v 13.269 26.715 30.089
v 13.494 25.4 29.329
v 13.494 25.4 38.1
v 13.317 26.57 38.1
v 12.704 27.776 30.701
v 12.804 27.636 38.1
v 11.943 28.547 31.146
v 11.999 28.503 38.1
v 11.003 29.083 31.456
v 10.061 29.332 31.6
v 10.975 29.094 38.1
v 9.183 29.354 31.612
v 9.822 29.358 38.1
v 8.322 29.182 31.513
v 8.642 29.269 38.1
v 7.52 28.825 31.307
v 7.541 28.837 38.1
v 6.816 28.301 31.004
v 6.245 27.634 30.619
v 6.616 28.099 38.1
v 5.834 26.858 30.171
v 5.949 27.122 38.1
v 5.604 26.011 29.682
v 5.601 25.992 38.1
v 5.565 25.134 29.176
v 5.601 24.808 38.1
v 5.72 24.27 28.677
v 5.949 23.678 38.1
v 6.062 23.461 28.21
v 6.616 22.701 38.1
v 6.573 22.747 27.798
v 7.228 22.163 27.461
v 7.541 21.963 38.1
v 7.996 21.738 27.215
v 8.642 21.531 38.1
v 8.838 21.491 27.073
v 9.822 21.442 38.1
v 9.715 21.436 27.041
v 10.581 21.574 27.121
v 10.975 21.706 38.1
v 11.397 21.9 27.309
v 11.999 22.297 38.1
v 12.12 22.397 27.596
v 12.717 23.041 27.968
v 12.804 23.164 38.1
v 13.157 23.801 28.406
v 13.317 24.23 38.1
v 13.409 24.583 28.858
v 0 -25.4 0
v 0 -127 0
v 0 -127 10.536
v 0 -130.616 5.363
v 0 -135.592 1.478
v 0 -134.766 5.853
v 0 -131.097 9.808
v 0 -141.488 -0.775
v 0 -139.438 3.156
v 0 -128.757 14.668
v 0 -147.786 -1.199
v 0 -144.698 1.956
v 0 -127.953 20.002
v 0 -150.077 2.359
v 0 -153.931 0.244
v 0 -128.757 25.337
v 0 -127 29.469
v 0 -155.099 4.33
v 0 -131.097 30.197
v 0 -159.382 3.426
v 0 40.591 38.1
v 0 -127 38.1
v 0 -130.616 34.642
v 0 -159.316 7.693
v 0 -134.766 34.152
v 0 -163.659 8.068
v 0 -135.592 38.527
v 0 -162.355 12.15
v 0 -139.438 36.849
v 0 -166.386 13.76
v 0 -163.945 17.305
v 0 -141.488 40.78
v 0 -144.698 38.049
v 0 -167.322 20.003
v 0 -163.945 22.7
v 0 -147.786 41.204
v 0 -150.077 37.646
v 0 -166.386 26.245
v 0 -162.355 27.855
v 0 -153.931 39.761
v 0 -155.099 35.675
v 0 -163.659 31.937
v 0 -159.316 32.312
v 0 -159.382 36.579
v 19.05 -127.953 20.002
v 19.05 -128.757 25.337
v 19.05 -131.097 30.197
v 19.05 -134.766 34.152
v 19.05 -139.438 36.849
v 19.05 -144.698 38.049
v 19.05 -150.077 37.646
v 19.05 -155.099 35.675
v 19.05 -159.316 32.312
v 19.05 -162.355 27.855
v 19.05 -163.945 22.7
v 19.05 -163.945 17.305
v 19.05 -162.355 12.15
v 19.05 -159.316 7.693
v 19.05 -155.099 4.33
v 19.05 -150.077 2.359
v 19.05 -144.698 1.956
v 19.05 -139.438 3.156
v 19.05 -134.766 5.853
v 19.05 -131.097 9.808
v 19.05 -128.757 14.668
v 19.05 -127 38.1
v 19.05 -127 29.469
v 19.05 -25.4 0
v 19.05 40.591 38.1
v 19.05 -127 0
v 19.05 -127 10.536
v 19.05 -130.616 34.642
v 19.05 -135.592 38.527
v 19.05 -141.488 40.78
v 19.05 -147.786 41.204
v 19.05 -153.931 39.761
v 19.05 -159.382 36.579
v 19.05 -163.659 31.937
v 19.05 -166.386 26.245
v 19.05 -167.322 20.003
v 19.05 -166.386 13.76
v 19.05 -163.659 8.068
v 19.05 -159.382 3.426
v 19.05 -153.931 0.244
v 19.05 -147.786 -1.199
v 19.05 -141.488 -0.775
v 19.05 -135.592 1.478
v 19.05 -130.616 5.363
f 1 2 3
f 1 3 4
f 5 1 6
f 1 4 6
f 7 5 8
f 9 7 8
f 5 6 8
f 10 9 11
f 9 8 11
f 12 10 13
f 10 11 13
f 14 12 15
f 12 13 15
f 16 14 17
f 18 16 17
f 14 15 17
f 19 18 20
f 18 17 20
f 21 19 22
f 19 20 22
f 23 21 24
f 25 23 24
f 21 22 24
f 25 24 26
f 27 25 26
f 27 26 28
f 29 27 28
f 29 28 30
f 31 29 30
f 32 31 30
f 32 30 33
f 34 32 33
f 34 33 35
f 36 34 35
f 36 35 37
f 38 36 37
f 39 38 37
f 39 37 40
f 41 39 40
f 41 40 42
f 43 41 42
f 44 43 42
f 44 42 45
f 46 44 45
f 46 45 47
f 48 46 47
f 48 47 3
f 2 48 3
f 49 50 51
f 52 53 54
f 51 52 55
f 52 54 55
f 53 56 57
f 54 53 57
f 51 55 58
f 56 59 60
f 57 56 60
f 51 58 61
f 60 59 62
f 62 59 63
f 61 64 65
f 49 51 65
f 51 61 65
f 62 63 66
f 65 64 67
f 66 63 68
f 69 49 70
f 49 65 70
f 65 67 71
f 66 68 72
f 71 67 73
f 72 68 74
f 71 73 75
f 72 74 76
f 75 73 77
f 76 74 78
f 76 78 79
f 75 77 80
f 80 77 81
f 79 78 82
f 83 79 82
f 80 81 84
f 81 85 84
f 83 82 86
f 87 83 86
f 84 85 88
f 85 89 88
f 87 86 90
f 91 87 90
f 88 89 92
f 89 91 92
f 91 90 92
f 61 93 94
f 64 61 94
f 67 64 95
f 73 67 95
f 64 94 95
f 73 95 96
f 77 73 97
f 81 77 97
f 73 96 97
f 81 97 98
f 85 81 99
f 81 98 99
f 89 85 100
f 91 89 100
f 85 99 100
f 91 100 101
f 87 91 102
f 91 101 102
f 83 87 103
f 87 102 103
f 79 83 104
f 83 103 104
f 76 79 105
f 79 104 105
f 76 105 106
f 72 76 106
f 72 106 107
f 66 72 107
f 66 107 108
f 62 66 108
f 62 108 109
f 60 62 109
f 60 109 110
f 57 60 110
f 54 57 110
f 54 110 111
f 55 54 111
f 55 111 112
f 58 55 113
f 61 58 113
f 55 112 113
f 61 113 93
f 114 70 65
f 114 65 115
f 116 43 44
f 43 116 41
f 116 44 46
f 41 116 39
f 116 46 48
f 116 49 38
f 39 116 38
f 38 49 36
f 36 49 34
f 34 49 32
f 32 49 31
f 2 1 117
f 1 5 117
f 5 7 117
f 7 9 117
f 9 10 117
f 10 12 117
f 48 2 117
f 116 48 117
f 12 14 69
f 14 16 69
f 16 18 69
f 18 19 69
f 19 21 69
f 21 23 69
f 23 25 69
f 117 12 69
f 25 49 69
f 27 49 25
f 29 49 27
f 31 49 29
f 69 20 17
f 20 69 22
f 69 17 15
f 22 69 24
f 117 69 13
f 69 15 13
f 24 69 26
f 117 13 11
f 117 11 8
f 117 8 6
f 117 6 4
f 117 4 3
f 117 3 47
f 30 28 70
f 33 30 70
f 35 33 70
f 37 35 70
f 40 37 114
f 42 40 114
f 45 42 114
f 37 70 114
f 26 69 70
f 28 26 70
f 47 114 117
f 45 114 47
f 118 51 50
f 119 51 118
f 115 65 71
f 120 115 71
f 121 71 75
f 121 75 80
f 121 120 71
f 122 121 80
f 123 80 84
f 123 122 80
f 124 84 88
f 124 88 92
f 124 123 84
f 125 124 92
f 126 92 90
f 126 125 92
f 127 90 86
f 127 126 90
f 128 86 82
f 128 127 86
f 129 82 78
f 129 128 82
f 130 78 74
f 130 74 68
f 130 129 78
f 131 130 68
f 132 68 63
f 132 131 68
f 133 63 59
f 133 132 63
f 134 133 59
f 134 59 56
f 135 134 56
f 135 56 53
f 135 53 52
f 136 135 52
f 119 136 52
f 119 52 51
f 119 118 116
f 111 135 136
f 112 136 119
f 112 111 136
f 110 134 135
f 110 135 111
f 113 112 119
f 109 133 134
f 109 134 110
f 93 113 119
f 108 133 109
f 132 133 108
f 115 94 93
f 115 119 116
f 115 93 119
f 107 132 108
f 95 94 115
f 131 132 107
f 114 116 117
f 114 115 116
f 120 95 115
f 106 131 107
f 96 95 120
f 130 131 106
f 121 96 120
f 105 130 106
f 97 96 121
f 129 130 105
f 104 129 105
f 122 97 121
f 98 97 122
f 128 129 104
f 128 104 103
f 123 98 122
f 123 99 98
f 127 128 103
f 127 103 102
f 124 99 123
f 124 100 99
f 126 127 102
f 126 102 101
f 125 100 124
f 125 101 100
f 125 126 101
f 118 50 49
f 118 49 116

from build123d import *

# Parameters (mm, degrees)
F0_W     = 19.05
F0_H     = 38.1
F1_DEPTH = 127
F2_R     = 18.0975
F3_DEPTH = 19.05
F5_R     = 3.96875
F6_DEPTH = 39.371
F8_DEPTH = 19.051


with BuildPart() as f1:
    # F0 (on Front) → F1 (new body, symmetric)
    with BuildSketch(Plane.XZ):
        with Locations((9.525, 19.05)):
            Rectangle(F0_W, F0_H)
    extrude(amount=F1_DEPTH, both=True)


with BuildPart() as f3:
    # F2 (on face) → F3 (new body)
    with BuildSketch(Plane.YZ.offset(19.05)):
        with BuildLine():
            Line((-127, 10.535887), (-127, 29.469113))
            ThreePointArc((-127, 29.469113), (-167.3225, 20.0025), (-127, 10.535887))
        make_face()
        with Locations((-146.05, 20.0025)):
            Circle(F2_R, mode=Mode.SUBTRACT)
    extrude(amount=-F3_DEPTH)

    # F4: union F1
    add(f1.part)

    # F5 (on face) → F6 (cut, through all)
    with BuildSketch(Plane.XY.offset(38.1)):
        with Locations((9.525, 25.4)):
            Circle(F5_R)
    extrude(amount=-F6_DEPTH, mode=Mode.SUBTRACT)

    # F7 (on face) → F8 (cut, through all)
    with BuildSketch(Plane(origin=(0, 0, 0), x_dir=(0, -1, 0), z_dir=(-1, 0, 0))):
        Polygon((-127, 0), (25.4, 0), (-40.591136, 38.1), (-127, 38.1), align=None)
    extrude(amount=-F8_DEPTH, mode=Mode.SUBTRACT)


solid = f3.part
